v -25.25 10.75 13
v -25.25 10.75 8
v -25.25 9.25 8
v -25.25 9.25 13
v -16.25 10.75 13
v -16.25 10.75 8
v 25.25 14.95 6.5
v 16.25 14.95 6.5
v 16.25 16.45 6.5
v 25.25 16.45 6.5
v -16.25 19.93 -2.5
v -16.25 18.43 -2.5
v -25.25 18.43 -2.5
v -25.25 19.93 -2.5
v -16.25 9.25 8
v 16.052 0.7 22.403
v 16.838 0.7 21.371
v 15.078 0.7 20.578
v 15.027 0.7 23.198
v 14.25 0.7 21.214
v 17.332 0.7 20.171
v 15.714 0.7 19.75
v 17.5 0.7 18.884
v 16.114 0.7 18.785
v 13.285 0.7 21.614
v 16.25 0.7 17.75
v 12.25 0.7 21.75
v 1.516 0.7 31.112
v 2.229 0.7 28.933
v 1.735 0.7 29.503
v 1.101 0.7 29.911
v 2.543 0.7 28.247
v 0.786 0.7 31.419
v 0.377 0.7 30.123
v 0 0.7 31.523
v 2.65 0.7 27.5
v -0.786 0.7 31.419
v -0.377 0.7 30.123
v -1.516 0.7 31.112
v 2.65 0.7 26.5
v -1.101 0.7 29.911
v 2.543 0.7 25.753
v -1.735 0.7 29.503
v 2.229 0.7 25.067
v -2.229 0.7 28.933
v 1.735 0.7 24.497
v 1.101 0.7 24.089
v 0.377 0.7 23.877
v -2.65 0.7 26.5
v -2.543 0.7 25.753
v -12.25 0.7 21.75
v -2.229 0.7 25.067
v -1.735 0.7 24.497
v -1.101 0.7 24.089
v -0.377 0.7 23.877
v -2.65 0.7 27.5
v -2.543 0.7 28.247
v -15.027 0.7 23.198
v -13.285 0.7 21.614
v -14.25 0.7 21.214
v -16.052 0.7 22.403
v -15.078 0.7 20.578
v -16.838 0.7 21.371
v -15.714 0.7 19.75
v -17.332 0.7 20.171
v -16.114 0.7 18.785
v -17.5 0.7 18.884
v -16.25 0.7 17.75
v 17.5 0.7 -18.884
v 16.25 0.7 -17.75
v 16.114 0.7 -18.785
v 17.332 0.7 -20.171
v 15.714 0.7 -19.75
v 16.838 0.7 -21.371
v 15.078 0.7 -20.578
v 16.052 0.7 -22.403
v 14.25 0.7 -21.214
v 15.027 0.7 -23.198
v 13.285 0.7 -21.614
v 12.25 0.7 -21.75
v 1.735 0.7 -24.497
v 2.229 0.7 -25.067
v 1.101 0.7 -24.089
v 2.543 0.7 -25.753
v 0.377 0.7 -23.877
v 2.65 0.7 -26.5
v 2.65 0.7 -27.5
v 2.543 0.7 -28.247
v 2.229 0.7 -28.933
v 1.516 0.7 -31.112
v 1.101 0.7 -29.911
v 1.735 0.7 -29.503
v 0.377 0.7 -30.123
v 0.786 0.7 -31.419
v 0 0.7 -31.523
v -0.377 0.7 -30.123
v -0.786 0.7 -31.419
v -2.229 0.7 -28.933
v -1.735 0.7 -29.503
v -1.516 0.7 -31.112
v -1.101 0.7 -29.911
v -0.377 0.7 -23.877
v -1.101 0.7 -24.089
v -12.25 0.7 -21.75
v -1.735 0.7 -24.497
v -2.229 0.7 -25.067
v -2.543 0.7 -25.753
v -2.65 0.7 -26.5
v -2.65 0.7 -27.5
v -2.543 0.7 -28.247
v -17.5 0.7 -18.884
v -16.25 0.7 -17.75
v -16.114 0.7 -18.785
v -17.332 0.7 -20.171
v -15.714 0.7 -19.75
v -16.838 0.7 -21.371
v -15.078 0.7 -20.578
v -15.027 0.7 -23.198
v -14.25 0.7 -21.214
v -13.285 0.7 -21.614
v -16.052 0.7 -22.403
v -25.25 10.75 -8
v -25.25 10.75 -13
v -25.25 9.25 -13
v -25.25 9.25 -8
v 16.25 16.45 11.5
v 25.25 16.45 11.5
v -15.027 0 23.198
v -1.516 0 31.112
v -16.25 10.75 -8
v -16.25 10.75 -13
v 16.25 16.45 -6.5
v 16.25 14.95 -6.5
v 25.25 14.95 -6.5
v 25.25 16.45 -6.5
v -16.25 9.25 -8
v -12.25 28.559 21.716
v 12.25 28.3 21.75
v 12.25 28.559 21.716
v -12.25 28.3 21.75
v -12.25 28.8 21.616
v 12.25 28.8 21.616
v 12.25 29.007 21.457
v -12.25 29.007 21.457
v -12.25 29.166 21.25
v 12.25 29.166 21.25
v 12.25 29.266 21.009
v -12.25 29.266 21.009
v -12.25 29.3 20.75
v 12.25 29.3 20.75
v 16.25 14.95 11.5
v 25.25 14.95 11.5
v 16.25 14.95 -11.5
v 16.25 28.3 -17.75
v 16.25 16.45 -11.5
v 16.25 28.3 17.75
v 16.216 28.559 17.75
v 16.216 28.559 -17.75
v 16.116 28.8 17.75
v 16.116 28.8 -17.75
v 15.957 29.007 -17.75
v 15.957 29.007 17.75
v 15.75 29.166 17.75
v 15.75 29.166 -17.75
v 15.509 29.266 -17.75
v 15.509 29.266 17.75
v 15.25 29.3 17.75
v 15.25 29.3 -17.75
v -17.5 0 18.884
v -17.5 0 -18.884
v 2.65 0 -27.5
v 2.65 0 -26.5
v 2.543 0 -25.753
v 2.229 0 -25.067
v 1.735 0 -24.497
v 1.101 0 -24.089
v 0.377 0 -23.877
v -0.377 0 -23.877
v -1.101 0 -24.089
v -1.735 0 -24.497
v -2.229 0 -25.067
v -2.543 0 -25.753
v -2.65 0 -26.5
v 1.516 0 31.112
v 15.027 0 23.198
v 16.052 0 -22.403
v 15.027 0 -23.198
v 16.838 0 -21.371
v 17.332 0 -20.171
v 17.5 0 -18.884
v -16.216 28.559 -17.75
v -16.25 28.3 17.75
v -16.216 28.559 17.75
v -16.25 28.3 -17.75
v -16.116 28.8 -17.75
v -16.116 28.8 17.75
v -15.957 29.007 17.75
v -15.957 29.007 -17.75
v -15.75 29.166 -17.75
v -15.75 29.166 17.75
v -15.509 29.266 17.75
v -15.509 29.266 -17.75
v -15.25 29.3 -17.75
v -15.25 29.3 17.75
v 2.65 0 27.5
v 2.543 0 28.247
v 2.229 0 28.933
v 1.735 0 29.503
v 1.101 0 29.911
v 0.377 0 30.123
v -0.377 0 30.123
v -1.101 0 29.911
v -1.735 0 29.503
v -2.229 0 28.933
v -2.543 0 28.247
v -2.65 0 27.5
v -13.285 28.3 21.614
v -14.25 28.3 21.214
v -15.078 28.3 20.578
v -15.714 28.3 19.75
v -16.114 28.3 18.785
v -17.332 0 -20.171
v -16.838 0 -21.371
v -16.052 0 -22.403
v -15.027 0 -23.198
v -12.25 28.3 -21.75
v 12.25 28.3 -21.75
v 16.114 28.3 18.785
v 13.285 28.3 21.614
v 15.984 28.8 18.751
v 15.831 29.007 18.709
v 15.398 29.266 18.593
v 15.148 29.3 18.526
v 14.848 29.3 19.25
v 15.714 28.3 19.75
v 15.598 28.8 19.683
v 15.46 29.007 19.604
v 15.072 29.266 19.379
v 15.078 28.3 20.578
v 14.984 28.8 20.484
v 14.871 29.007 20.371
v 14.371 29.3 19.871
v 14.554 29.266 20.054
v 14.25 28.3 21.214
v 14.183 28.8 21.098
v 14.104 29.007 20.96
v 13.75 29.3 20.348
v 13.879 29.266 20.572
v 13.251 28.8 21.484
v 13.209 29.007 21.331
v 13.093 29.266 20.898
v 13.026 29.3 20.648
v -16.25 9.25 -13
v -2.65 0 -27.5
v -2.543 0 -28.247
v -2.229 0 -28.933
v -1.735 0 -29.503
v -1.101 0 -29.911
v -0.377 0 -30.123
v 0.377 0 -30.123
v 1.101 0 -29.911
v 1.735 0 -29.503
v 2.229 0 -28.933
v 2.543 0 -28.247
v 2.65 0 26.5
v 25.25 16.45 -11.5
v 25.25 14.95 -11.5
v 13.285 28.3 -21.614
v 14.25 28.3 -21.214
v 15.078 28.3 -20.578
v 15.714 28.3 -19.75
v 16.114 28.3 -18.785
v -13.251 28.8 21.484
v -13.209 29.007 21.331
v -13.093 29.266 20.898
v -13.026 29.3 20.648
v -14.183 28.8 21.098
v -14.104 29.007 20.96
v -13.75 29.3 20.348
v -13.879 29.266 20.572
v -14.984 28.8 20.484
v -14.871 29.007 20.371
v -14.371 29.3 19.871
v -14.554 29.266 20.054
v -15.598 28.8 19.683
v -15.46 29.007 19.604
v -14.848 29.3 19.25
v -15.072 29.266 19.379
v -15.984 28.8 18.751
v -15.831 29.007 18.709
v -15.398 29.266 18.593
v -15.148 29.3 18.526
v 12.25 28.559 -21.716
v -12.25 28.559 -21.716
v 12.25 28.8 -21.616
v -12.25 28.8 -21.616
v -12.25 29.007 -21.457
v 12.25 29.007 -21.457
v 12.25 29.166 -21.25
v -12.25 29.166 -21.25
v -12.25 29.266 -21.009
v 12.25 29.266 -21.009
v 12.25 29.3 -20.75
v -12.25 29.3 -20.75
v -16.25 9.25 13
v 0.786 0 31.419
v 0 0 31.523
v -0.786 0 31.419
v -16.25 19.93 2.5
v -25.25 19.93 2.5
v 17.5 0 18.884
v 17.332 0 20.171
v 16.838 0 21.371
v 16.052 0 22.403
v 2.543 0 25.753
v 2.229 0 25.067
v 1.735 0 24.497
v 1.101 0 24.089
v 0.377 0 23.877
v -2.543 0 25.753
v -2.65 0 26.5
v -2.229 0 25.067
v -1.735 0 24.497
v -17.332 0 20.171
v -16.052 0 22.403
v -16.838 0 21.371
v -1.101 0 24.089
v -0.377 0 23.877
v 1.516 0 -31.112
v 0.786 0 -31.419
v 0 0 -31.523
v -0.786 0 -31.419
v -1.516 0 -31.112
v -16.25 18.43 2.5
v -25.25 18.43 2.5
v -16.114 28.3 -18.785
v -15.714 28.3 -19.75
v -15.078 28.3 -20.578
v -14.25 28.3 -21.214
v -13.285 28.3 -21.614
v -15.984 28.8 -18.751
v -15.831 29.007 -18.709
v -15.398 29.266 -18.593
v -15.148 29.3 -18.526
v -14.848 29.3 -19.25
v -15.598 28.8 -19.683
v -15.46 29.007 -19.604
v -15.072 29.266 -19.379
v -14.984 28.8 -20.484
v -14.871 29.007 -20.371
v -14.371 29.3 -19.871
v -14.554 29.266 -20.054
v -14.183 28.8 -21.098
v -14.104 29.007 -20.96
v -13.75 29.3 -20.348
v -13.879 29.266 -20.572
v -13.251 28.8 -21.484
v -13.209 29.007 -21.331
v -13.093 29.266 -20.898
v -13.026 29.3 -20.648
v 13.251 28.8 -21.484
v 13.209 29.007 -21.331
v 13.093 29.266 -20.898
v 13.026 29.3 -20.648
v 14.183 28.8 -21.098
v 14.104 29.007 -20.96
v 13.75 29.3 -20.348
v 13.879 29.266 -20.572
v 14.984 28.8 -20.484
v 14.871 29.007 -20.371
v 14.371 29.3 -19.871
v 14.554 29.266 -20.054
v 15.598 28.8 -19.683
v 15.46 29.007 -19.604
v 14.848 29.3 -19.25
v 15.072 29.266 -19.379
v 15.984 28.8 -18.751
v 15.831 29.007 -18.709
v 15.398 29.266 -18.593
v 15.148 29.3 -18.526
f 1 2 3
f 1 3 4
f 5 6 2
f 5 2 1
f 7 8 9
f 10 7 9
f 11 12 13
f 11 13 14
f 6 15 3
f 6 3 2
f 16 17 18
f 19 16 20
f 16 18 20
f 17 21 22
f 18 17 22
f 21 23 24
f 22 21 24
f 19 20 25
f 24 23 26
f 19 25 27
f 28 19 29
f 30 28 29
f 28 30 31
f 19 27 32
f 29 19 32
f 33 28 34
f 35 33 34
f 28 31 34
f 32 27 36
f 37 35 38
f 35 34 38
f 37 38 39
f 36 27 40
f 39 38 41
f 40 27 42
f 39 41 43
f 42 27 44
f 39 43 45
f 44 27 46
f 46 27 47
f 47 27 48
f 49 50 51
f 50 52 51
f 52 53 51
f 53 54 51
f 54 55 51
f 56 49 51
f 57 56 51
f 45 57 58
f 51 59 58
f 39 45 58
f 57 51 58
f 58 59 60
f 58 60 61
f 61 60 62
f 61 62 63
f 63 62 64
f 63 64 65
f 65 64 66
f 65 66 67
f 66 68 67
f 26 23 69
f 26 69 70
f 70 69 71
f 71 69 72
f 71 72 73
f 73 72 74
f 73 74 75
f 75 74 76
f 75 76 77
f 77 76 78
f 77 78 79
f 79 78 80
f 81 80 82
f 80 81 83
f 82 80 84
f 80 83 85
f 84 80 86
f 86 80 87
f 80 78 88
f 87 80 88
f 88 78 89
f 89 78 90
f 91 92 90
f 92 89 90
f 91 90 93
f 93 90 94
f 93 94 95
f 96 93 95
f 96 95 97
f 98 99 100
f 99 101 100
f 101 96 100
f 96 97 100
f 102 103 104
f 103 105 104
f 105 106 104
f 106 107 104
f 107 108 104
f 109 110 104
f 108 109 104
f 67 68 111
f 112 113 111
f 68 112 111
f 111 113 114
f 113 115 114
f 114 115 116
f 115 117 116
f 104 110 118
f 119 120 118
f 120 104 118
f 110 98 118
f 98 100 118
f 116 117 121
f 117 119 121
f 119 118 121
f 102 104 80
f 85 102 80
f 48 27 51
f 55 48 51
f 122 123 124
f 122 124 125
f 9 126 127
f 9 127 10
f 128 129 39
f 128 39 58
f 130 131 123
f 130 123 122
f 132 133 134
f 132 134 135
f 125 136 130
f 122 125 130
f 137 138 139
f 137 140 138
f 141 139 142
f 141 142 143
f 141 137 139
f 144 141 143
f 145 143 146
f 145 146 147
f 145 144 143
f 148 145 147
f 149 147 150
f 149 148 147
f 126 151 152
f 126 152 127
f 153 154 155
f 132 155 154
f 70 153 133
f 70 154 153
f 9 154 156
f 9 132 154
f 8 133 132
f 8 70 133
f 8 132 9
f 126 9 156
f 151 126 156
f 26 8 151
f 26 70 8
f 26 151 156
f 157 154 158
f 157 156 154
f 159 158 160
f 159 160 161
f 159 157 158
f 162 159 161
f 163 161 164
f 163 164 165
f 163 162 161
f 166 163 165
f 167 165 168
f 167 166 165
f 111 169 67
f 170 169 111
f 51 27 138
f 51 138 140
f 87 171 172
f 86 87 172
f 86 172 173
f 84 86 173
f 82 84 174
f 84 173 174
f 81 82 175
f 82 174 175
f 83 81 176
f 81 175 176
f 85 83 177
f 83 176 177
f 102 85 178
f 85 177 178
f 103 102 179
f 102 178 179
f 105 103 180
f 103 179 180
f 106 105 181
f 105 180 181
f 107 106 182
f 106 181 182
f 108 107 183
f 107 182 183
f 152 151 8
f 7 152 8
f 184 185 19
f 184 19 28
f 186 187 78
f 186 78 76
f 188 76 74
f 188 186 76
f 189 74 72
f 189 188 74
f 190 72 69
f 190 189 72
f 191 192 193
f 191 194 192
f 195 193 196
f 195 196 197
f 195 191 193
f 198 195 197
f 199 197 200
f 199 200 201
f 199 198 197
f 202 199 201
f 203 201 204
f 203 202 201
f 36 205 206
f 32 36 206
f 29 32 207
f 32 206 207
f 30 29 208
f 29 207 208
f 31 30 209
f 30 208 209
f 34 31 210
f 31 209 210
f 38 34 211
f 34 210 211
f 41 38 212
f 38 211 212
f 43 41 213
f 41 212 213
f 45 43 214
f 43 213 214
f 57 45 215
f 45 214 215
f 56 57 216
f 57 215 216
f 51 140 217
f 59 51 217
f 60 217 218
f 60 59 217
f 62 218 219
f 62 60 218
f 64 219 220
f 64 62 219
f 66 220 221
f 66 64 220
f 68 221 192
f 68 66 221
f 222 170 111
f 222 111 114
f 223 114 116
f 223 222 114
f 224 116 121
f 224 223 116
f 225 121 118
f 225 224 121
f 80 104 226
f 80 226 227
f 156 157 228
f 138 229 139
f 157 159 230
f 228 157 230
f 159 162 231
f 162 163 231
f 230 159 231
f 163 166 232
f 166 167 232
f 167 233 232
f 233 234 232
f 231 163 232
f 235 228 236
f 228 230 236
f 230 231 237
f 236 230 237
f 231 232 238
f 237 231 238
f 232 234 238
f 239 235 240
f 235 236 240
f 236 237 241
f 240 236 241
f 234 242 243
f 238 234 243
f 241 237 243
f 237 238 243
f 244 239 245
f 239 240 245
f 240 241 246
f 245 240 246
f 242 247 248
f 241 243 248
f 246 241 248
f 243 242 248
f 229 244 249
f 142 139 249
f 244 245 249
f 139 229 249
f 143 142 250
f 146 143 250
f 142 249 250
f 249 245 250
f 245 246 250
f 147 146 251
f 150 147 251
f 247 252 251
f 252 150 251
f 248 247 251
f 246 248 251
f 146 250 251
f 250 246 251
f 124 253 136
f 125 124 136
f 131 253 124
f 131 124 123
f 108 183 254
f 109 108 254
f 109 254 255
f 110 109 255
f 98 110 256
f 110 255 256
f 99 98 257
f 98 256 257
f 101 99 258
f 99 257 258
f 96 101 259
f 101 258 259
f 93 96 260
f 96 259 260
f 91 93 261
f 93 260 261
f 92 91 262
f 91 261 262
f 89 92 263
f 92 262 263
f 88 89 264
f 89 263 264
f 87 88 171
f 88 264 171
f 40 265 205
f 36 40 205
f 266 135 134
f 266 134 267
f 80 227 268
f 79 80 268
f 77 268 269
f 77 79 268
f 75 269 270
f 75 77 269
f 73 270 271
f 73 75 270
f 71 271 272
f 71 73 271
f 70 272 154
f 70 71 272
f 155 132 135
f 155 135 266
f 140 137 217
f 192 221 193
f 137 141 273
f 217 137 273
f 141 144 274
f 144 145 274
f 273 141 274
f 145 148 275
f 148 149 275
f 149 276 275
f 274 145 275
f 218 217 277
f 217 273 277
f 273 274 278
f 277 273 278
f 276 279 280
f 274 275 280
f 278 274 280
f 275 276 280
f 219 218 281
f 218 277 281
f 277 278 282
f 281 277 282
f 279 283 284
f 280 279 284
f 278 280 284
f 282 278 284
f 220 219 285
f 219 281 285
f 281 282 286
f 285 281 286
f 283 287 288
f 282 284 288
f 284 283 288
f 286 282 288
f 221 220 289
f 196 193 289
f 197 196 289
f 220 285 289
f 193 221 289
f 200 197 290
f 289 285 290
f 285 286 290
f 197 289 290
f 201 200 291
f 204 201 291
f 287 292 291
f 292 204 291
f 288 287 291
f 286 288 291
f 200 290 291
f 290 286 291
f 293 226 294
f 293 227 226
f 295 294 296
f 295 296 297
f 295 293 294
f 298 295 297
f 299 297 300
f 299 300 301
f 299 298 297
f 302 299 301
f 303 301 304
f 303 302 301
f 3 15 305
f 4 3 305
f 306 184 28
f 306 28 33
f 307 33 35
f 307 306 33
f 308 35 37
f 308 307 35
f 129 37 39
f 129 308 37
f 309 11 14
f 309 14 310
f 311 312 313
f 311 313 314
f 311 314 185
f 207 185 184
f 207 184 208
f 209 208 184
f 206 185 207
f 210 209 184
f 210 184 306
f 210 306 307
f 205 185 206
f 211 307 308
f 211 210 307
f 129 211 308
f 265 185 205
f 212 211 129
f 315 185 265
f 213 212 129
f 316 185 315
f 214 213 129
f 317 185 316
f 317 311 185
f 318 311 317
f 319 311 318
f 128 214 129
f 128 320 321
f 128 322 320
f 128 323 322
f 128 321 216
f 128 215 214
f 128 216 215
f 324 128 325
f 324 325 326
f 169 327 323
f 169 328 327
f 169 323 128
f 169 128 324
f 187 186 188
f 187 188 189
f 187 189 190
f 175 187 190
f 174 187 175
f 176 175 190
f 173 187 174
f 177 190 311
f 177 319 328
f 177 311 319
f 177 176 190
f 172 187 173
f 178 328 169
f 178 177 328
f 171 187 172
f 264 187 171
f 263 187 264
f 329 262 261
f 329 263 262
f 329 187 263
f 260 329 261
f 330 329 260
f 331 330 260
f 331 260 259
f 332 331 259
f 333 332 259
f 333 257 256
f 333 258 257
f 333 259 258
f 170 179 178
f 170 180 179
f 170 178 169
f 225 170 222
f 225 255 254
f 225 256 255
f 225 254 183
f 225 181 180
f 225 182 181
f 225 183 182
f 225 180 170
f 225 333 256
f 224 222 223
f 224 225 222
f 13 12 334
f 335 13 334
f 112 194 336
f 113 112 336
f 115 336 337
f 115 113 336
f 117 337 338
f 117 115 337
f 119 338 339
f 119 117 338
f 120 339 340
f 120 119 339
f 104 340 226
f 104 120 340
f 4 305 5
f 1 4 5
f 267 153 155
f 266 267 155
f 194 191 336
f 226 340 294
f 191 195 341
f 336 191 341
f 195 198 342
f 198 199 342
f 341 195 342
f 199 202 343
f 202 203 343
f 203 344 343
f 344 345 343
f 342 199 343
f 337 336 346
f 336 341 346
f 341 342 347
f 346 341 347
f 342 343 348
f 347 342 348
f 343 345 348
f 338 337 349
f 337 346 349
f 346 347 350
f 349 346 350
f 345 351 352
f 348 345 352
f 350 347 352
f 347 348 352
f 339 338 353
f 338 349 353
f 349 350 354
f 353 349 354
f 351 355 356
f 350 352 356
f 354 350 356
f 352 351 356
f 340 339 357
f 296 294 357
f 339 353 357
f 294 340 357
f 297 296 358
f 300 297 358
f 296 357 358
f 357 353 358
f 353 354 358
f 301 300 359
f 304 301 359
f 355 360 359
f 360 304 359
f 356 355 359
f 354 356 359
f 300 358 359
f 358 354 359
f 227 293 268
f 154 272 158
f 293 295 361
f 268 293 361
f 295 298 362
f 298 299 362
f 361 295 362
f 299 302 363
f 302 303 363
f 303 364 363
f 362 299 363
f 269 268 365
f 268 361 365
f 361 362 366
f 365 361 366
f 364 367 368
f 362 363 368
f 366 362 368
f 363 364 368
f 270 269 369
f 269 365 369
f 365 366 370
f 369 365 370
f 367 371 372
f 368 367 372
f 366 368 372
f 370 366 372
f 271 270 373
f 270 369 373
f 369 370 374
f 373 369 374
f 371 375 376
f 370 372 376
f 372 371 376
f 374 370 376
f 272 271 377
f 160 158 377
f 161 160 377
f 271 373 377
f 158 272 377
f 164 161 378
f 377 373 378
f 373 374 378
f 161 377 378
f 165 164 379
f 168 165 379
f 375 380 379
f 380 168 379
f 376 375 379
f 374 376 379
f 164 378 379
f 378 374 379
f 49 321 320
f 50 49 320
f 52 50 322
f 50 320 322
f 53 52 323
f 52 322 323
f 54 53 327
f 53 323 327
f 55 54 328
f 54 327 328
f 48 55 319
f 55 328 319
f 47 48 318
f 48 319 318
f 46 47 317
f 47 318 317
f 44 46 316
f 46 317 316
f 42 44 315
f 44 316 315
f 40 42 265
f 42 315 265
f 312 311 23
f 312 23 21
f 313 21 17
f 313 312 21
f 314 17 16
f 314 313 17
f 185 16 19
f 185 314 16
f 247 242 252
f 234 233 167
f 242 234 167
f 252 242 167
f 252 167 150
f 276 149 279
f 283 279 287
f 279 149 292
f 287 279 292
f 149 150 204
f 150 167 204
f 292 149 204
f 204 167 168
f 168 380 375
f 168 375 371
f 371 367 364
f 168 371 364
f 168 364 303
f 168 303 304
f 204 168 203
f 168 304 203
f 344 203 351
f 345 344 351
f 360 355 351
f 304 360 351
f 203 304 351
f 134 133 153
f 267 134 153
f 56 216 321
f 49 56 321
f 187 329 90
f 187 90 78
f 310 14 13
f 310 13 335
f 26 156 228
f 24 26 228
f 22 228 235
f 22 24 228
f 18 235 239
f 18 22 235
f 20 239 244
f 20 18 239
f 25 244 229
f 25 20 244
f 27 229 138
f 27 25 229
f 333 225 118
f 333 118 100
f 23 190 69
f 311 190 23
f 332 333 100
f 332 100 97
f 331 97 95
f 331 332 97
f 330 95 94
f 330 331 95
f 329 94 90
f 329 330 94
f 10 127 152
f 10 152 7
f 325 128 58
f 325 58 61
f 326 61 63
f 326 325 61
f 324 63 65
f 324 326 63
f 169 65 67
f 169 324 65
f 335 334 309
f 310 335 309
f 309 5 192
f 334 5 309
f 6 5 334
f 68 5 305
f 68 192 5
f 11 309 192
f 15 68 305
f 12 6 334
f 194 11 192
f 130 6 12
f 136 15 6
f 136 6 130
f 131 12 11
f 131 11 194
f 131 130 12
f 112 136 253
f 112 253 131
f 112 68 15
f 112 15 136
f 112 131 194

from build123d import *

# Parameters (mm, degrees)
BOSS_EXTRUDE1_DEPTH = 0.7
BOSS_EXTRUDE2_DEPTH = 28.6
SKETCH3_W           = 5
SKETCH3_H           = 1.5
BOSS_EXTRUDE3_DEPTH = 9
SKETCH4_W           = 5
SKETCH4_H           = 1.5
BOSS_EXTRUDE4_DEPTH = 9
FILLET1_R           = 1


with BuildPart() as part:
    # Sketch1 → Boss-Extrude1 (new body)
    with BuildSketch(Plane(origin=(0, 0, 0), x_dir=(1, 0, 0), z_dir=(0, 1, 0))):
        with BuildLine():
            Line((-17.5, 0), (-17.5, 18.884045511))
            ThreePointArc((-17.5, 18.884045511), (-16.837918728, 21.370501041), (-15.027015558, 23.198462316))
            Line((-15.027015558, 23.198462316), (-1.516209335, 31.111934533))
            ThreePointArc((-1.516209335, 31.111934533), (0, 31.523284449), (1.516209335, 31.111934533))
            Line((1.516209335, 31.111934533), (15.027015558, 23.198462316))
            ThreePointArc((15.027015558, 23.198462316), (16.837918728, 21.370501041), (17.5, 18.884045511))
            Line((17.5, 18.884045511), (17.5, 0))
            Line((17.5, 0), (17.5, -18.884045511))
            ThreePointArc((17.5, -18.884045511), (16.837918728, -21.370501041), (15.027015558, -23.198462316))
            Line((15.027015558, -23.198462316), (1.516209335, -31.111934533))
            ThreePointArc((1.516209335, -31.111934533), (0, -31.523284449), (-1.516209335, -31.111934533))
            Line((-1.516209335, -31.111934533), (-15.027015558, -23.198462316))
            ThreePointArc((-15.027015558, -23.198462316), (-16.837918728, -21.370501041), (-17.5, -18.884045511))
            Line((-17.5, -18.884045511), (-17.5, 0))
        make_face()
        with BuildLine():
            Line((2.65, 27.5), (2.65, 26.5))
            ThreePointArc((2.65, 26.5), (0, 23.85), (-2.65, 26.5))
            Line((-2.65, 26.5), (-2.65, 27.5))
            ThreePointArc((-2.65, 27.5), (0, 30.15), (2.65, 27.5))
        make_face(mode=Mode.SUBTRACT)
        with BuildLine():
            Line((2.65, -26.5), (2.65, -27.5))
            ThreePointArc((2.65, -27.5), (0, -30.15), (-2.65, -27.5))
            Line((-2.65, -27.5), (-2.65, -26.5))
            ThreePointArc((-2.65, -26.5), (0, -23.85), (2.65, -26.5))
        make_face(mode=Mode.SUBTRACT)
    extrude(amount=BOSS_EXTRUDE1_DEPTH)

    # Sketch2 → Boss-Extrude2 (add)
    with BuildSketch(Plane(origin=(0, 0.7, 0), x_dir=(1, 0, 0), z_dir=(0, 1, 0))):
        with BuildLine():
            Line((-12.25, 21.75), (12.25, 21.75))
            ThreePointArc((12.25, 21.75), (15.078427125, 20.578427125), (16.25, 17.75))
            Line((16.25, 17.75), (16.25, -17.75))
            ThreePointArc((16.25, -17.75), (15.078427125, -20.578427125), (12.25, -21.75))
            Line((12.25, -21.75), (-12.25, -21.75))
            ThreePointArc((-12.25, -21.75), (-15.078427125, -20.578427125), (-16.25, -17.75))
            Line((-16.25, -17.75), (-16.25, 17.75))
            ThreePointArc((-16.25, 17.75), (-15.078427125, 20.578427125), (-12.25, 21.75))
        make_face()
    extrude(amount=BOSS_EXTRUDE2_DEPTH)

    # Sketch3 → Boss-Extrude3 (add)
    with BuildSketch(Plane.ZY.offset(16.25)):
        with Locations((-10.5, 10)):
            Rectangle(SKETCH3_W, SKETCH3_H)
        with Locations((10.5, 10)):
            Rectangle(SKETCH3_W, SKETCH3_H)
        with Locations((0, 19.18013067)):
            Rectangle(SKETCH3_W, SKETCH3_H)
    extrude(amount=BOSS_EXTRUDE3_DEPTH)

    # Sketch4 → Boss-Extrude4 (add)
    with BuildSketch(Plane(origin=(16.25, 0, 0), x_dir=(0, 0, -1), z_dir=(1, 0, 0))):
        with Locations((-9, 15.7)):
            Rectangle(SKETCH4_W, SKETCH4_H)
        with Locations((9, 15.7)):
            Rectangle(SKETCH4_W, SKETCH4_H)
    extrude(amount=BOSS_EXTRUDE4_DEPTH)

    # Fillet1
    fillet1_edges = [part.edges().sort_by_distance(p)[0] for p in [
        (-15.078427125, 29.3, 20.578427125),
        (0, 29.3, 21.75),
        (15.078427125, 29.3, 20.578427125),
        (16.25, 29.3, 0),
        (15.078427125, 29.3, -20.578427125),
        (0, 29.3, -21.75),
        (-15.078427125, 29.3, -20.578427125),
        (-16.25, 29.3, 0),
    ]]
    fillet(fillet1_edges, radius=FILLET1_R)


solid = part.part
